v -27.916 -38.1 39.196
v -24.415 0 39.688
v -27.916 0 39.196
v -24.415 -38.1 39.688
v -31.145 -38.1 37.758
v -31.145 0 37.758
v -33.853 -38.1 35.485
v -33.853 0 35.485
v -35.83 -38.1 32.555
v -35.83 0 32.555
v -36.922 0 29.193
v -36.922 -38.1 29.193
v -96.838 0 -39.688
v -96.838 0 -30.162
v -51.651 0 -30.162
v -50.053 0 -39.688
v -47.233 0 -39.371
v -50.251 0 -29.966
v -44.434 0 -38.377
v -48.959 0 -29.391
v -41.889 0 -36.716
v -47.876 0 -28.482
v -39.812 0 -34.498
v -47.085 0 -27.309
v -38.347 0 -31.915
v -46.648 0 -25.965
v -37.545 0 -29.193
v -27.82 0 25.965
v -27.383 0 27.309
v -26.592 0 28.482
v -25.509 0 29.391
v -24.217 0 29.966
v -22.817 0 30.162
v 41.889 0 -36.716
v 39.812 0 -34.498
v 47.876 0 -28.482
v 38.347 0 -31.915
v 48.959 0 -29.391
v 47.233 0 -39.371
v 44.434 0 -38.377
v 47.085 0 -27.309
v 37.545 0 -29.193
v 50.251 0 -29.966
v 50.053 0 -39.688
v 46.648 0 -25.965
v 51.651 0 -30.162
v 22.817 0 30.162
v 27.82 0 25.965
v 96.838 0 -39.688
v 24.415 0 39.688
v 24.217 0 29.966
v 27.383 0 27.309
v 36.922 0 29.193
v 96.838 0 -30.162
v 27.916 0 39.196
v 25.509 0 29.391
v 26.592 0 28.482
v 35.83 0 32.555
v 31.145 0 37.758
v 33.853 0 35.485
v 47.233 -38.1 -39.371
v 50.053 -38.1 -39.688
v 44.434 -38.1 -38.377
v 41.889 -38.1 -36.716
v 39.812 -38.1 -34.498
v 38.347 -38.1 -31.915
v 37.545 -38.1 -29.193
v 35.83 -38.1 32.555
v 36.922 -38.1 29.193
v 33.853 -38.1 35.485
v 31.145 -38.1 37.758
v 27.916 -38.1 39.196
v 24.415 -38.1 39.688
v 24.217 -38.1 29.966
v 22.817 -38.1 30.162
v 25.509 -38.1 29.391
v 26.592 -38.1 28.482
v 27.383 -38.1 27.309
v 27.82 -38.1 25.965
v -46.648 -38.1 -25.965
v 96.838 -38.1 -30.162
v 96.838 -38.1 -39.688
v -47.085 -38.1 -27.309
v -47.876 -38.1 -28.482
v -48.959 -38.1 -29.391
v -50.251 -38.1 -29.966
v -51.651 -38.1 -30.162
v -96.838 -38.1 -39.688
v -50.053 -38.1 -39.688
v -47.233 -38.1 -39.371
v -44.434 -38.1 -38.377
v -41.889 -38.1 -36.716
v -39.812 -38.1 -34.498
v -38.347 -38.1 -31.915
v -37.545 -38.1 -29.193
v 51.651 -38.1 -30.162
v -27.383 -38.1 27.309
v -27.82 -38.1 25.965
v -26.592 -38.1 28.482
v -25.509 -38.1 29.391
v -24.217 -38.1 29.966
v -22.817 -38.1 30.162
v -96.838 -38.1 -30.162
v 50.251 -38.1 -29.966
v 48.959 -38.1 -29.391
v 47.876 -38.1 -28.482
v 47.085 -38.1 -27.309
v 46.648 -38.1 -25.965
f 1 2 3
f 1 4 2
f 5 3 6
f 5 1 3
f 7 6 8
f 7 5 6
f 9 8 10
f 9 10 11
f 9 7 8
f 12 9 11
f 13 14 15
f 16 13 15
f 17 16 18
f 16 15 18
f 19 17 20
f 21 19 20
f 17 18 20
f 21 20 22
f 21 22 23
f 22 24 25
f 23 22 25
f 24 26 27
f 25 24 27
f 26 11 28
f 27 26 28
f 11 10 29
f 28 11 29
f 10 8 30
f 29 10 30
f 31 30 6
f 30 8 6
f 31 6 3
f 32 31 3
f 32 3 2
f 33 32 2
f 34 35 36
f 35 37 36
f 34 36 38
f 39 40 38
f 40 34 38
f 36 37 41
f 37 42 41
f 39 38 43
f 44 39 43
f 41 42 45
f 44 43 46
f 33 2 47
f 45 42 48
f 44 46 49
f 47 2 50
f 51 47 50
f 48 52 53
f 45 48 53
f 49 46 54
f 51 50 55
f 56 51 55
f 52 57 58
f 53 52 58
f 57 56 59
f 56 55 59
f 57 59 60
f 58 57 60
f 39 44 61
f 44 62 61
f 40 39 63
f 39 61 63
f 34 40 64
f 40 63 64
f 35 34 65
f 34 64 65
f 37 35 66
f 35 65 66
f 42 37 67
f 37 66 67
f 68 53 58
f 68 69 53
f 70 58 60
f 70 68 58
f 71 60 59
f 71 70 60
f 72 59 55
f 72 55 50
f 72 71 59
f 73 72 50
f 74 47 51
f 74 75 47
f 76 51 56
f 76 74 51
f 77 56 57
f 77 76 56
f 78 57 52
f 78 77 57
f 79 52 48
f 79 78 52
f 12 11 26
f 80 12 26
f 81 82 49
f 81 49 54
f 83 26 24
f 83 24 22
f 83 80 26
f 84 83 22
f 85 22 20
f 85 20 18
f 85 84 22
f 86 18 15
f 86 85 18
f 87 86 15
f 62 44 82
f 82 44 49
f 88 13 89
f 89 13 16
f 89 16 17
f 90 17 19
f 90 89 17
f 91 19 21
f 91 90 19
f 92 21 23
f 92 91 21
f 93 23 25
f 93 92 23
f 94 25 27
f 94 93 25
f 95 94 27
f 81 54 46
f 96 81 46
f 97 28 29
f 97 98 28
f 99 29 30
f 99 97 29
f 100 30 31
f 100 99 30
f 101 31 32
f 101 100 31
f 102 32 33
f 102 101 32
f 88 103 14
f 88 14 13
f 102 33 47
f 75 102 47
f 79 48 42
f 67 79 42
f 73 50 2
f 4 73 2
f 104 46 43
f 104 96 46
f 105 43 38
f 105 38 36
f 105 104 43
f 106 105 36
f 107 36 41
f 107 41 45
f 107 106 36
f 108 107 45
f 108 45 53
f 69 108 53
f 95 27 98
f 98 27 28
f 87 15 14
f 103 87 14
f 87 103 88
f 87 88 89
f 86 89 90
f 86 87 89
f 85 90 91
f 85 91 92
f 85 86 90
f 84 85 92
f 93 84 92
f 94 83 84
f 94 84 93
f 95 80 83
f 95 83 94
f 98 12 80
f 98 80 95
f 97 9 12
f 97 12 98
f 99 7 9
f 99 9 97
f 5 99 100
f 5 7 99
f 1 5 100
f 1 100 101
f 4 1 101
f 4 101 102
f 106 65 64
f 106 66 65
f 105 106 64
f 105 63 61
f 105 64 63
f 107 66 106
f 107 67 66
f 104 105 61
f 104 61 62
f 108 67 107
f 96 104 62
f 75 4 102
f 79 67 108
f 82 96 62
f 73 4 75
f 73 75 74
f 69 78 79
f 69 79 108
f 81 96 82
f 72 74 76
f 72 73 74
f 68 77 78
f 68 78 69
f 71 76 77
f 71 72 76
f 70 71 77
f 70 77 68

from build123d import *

# Parameters (mm, degrees)
F1_DEPTH = 38.1
F2_R     = 5.08
F3_R     = 12.7


with BuildPart() as f1:
    # F0 (on Front) → F1 (new body)
    with BuildSketch(Plane.XZ):
        Polygon((39.395954, -39.6875), (96.8375, -39.6875), (96.8375, -30.1625), (47.388378, -30.1625), (35.071938, 39.6875), (-35.071938, 39.6875), (-47.388378, -30.1625), (-96.8375, -30.1625), (-96.8375, -39.6875), (-39.395954, -39.6875), (-37.71644, -30.1625), (-27.079514, 30.1625), (27.079514, 30.1625), (37.71644, -30.1625), align=None)
    extrude(amount=F1_DEPTH)

    # F2
    f2_edges = [f1.edges().sort_by_distance(p)[0] for p in [
        (-27.079514, -19.05, 30.1625),
        (27.079514, -19.05, 30.1625),
        (47.388378, -19.05, -30.1625),
        (-47.388378, -19.05, -30.1625),
    ]]
    fillet(f2_edges, radius=F2_R)

    # F3
    f3_edges = [f1.edges().sort_by_distance(p)[0] for p in [
        (-39.395954, -19.05, -39.6875),
        (39.395954, -19.05, -39.6875),
        (35.071938, -19.05, 39.6875),
        (-35.071938, -19.05, 39.6875),
    ]]
    fillet(f3_edges, radius=F3_R)


solid = f1.part
